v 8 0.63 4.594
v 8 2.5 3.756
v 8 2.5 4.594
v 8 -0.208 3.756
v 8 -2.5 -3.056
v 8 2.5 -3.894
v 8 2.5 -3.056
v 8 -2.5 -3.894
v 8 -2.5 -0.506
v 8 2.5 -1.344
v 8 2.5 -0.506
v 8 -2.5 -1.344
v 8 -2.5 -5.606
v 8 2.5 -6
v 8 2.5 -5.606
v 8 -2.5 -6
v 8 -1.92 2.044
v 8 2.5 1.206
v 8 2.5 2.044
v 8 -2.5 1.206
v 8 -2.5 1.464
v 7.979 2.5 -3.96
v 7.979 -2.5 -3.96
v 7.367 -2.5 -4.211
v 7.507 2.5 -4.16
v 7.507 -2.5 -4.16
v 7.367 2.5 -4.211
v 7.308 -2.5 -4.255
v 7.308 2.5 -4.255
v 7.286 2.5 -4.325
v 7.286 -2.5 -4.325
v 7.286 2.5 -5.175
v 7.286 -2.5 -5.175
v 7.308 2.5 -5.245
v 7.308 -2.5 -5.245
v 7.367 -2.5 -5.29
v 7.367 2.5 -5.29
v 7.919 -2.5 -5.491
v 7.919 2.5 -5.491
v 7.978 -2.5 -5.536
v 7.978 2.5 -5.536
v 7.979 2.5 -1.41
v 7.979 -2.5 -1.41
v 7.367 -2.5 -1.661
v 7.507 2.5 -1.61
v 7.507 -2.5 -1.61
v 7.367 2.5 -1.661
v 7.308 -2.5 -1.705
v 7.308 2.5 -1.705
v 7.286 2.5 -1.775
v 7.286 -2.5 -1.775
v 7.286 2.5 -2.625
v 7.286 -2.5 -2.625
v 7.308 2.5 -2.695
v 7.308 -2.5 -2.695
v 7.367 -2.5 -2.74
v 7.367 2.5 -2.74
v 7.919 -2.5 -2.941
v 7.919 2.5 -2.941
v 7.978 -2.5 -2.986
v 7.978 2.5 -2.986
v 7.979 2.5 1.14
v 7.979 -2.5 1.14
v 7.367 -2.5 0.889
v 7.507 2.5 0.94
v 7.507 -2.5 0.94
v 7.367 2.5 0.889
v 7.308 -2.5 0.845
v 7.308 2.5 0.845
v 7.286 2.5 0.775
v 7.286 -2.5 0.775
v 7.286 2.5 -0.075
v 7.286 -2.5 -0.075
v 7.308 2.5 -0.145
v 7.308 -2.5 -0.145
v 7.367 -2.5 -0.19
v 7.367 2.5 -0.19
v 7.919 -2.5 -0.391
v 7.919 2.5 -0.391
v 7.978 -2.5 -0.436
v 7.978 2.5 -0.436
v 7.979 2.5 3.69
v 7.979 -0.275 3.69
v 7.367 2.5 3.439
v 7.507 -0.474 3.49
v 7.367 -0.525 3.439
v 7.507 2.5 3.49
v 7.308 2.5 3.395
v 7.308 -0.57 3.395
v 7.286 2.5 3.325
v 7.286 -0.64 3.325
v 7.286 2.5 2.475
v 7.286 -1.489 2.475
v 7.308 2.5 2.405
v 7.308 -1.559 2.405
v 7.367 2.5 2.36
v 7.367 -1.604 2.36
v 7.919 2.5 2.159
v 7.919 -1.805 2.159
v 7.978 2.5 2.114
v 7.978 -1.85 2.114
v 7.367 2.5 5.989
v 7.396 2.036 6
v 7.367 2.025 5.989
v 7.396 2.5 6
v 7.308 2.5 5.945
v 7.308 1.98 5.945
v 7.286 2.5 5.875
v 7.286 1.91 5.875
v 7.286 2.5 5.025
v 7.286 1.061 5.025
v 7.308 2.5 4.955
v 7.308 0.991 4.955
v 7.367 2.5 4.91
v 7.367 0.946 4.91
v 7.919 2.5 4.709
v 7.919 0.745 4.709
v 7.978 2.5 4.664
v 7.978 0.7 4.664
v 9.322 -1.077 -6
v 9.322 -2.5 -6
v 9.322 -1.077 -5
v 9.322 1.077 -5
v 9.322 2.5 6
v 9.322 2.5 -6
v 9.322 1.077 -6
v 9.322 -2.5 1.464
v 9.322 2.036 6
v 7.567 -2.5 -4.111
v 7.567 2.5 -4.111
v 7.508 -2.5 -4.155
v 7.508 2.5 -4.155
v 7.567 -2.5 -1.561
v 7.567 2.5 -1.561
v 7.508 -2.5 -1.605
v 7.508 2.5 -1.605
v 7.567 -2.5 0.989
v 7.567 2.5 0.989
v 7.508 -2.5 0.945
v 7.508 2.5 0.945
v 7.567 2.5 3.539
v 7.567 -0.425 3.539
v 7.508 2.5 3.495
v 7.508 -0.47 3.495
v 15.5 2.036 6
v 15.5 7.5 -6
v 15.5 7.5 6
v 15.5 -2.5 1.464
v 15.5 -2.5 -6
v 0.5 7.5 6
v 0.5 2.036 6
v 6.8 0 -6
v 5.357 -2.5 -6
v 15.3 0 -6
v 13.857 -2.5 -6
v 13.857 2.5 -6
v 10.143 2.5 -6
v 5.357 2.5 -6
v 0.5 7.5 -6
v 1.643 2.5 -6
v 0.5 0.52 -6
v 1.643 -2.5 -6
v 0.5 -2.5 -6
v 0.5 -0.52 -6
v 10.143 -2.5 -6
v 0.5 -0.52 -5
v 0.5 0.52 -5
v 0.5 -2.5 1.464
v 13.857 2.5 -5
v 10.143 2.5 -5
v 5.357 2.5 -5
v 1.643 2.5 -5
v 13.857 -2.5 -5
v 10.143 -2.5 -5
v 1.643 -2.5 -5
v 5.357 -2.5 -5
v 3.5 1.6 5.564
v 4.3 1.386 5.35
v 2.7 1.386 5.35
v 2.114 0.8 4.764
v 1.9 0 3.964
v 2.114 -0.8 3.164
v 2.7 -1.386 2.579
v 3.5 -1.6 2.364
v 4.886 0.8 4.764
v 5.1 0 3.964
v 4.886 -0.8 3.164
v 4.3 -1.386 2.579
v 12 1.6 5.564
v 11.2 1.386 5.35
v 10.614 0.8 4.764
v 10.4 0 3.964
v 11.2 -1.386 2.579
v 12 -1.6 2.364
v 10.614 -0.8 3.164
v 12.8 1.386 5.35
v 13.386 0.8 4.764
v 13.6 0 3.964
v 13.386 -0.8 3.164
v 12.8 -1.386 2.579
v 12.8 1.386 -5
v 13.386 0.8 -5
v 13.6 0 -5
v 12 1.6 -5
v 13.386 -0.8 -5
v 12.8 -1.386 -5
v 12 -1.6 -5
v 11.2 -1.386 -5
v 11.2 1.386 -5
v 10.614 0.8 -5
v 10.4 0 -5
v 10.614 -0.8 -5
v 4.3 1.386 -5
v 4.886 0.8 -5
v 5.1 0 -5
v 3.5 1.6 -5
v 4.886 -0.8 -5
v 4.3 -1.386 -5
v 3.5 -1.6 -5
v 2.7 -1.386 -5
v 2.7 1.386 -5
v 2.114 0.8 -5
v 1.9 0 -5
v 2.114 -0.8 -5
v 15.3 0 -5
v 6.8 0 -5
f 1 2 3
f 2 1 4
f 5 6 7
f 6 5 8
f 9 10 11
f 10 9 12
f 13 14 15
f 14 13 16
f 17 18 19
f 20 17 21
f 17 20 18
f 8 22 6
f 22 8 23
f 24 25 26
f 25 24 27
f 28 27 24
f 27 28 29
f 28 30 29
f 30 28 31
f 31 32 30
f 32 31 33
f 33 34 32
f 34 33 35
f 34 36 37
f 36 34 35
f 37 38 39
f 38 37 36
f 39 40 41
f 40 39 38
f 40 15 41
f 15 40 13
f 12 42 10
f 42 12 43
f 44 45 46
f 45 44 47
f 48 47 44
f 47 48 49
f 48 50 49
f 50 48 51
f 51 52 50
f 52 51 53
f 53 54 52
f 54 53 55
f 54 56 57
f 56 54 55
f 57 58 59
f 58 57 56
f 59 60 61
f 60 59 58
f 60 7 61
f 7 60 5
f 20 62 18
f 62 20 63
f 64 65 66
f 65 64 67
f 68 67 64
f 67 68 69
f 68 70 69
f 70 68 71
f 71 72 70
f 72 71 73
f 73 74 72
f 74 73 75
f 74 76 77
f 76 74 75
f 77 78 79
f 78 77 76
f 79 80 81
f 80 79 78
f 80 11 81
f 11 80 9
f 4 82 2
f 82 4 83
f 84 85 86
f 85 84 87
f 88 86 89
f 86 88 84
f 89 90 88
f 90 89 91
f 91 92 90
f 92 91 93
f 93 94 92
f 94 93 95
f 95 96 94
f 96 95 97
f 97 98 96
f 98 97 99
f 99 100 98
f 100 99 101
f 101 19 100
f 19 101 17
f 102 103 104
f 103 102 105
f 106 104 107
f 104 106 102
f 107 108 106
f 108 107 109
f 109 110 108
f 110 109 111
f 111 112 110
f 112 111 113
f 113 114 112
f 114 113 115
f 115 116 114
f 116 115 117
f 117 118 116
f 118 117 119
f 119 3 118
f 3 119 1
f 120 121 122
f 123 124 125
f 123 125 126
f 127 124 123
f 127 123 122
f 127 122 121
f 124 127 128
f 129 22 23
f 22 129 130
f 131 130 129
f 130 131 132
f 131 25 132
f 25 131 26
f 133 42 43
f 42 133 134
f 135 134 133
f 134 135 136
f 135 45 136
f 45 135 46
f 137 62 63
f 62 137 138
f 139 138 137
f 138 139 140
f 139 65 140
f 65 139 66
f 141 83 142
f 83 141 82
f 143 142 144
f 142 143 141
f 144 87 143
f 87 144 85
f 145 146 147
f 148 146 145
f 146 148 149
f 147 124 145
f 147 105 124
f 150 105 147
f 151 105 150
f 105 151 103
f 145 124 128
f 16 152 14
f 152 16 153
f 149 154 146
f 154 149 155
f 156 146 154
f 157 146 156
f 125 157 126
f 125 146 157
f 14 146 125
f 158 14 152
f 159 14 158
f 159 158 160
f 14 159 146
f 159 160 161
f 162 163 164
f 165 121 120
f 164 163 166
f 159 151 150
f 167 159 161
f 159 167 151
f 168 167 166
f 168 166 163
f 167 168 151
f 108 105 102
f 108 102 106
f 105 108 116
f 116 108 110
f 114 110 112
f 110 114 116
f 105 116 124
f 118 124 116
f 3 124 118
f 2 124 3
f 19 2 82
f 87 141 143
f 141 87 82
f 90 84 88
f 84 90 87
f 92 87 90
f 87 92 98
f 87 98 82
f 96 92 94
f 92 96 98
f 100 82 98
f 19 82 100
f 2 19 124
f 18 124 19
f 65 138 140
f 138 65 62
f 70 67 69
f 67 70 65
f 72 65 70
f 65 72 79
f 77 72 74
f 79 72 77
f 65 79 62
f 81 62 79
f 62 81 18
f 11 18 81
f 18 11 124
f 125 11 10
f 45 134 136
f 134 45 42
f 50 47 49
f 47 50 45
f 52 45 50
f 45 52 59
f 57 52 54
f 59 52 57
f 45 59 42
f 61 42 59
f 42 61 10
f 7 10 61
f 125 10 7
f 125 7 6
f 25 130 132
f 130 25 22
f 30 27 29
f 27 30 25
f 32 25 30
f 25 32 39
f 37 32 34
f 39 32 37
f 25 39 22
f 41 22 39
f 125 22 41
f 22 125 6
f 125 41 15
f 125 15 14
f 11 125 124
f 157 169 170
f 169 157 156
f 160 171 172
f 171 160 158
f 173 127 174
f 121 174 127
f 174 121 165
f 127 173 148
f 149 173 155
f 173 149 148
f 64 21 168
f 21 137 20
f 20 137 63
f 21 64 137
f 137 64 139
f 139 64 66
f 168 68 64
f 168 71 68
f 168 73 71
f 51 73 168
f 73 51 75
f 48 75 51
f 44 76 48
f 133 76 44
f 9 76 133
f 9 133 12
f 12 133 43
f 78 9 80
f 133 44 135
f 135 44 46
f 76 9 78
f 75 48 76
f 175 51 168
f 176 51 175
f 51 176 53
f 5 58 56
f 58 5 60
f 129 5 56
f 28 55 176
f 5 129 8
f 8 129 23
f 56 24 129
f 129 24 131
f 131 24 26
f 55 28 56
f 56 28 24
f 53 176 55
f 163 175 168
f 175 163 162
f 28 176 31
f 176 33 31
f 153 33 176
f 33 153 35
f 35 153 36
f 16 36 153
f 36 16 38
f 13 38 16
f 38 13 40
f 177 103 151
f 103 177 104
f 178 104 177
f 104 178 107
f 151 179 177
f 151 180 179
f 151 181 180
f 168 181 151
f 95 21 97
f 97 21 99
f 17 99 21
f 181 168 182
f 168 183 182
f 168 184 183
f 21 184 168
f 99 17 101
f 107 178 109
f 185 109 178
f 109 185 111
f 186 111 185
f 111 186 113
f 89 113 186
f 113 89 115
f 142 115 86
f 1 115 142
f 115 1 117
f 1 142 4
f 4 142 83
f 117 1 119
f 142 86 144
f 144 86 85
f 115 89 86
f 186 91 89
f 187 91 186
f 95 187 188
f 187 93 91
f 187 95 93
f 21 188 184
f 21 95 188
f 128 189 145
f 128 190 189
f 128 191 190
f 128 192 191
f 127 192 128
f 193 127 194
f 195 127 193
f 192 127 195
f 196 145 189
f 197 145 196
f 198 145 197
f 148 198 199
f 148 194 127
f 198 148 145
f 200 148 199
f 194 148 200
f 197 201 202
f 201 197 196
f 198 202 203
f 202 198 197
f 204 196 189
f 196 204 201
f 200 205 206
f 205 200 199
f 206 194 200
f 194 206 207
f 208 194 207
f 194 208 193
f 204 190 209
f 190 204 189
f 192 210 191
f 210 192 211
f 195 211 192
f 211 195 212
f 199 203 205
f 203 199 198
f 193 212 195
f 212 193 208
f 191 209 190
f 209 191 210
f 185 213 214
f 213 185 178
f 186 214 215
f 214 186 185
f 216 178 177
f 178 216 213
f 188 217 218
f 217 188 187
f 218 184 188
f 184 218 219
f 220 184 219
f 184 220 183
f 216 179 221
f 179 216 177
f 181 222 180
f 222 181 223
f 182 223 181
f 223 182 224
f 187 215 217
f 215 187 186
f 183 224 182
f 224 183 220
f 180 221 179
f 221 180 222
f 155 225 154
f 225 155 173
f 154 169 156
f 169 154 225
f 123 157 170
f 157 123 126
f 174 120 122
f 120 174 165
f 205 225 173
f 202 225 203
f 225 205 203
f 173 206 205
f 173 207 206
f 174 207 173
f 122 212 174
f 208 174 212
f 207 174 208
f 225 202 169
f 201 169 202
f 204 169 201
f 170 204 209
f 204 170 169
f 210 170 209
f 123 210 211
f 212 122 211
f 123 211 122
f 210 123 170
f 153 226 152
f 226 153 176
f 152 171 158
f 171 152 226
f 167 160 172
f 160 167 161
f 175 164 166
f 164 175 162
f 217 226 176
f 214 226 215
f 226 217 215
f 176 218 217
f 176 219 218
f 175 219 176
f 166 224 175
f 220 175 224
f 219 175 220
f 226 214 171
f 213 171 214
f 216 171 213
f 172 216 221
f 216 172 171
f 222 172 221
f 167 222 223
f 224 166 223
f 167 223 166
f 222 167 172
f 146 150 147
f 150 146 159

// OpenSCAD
// file: linear_bearing.scad
// LM8UU
lm8uu_od = 19;
lm8uu_length = 29;
lm8uu_id = 10.2;
/**/

// LME8UU
/*
lm8uu_od = 16
lm8uu_length = 25
lm8uu_id = 8.1
/**/


// these values should be copied from your slicing program

layer_height = 0.2;

// SKEINFORGE calculates extrusion_width = layer_height * perimeter_width_over_thickness
// SFACT exposes this directly
// SLIC3R lists extrusion width in the header of exported gcode files as "single wall width"
//        it also allows you to specify as extrusion_width = layer_height * extrusion_width_ratio if you want to force it

extrusion_width = 0.6;

// this should also come from your slicing program, however it's usually an internal value. Most use approximately 0.15

overlap_ratio = 0.15;

// leave this as is, or punch in a value if you have an exact figure in mind
wall_width = extrusion_width * 2 - extrusion_width * overlap_ratio; 

echo("wall_width: ",wall_width);

// this is how many points of contact we have
fins = 5;

// this is how long the points of contact are vs the space between them
// if you make it too small, there's no gaps in the middle ring and we lose the springiness

contact_percent = 20;

// this is how far around the fins twist.
// 100% = the head of one overlaps the tail of the next one
twist_percent = 50;

/****************************************************
	you shouldn't need to touch anything below here
*****************************************************/

// make sure all the circles have parallel segments
$fn=64;


union() {
	// outer ring
	difference() {
		cylinder(r=lm8uu_od / 2, h=lm8uu_length - layer_height);
		translate([0, 0, -1]) cylinder(r=lm8uu_od / 2 - wall_width, h=lm8uu_length + 2);
	}
	
	// inner extruded profile
	linear_extrude(height = lm8uu_length - layer_height, twist=360 / fins * twist_percent / 100, slices = (lm8uu_length - layer_height) * 2)
		for (i=[0:fins - 1])
			rotate(360 / fins * i)
				union() /**/ {
					intersection() {
						difference() {
							circle(lm8uu_od / 2);
							translate([-lm8uu_od, -lm8uu_od]) square([lm8uu_od, lm8uu_od * 2]);
							rotate(360 / fins * contact_percent / 100)
								translate([0, -lm8uu_od])
									square([lm8uu_od, lm8uu_od * 2]);
						}
						difference() {
							circle(r=lm8uu_id / 2 + wall_width);
							circle(r=lm8uu_id / 2);
						}
					}
					
					intersection() {
						rotate(360 / fins * contact_percent / 100) difference() {
							circle(lm8uu_od / 2);
							translate([-lm8uu_od, -lm8uu_od]) square([lm8uu_od, lm8uu_od * 2]);
							rotate(360 / fins * (1 - (contact_percent / 100))) translate([0, -lm8uu_od]) square([lm8uu_od, lm8uu_od * 2]);
						}
						difference() {
							circle(r=lm8uu_id / 2 + wall_width * 2);
							circle(r=lm8uu_id / 2 + wall_width);
						}
					}
					
					rotate(360 / fins) translate([0, -lm8uu_id / 2 - wall_width / 2]) circle(wall_width / 2, $fn=16);
					rotate(360 / fins * contact_percent / 100) translate([0, -lm8uu_id / 2 - wall_width / 2]) circle(wall_width / 2, $fn=16);
					rotate(360 / fins * contact_percent / 100) translate([0, -lm8uu_id / 2 - wall_width * 1.5]) circle(wall_width / 2, $fn=16);
					rotate(360 / fins) translate([0, -lm8uu_id / 2 - wall_width * 1.5]) circle(wall_width / 2, $fn=16);
					rotate(360 / fins * contact_percent / 100) translate([-wall_width / 2, -lm8uu_id / 2 - wall_width * 1.5]) square([wall_width, wall_width]);
					rotate(360 / fins) translate([-wall_width / 2, -lm8uu_id / 2 - wall_width * 1.5]) square([wall_width, wall_width]);
					rotate(360 / fins * contact_percent / 100 + 360 / fins * (1 - (contact_percent / 100)) / 2) translate([-wall_width / 2, -lm8uu_id / 2 - wall_width * 1.5]) mirror([0, 1]) square([wall_width, (lm8uu_od / 2 - wall_width / 2) - (lm8uu_id / 2 + wall_width * 1.5)]);
	
				}
}
// file: carriage-V1.2.scad
// Enlarged Rostock Motor End inspired from Jcrocholl modified by Kolergy to:
//    - Take 12x1000mm smooth rods and KB-12-WW Linear Bearings
//    - Should clip the bearings (Not yet tested)
//    - 0.10° bearing holder angles to compensate play
//    - Changed droove to improve fabricability
//    - T2.5 self locking belt mount based on belt_coupler_v6 from Okatake

 
include <configuration.scad>
use <linear_bearing.scad>
use <belt_coupler_v6_Mod.scad>

H  = carriage_height;
W  = 60;
d  = 22;
th = 4;

width = 76;                  // Caridge widith
//height = carriage_height;

offset = 25;
cutout = 13;                 // Universal joint cutout
middle = 2*offset - width/2;


//% translate([ W/2, 0, 0]) linear_bearing("KB-12-WW");
//% translate([-W/2, 0, 0]) linear_bearing("KB-12-WW");

module conical_groove(d1, d2, w) {
	difference() {
		translate([0, 0, -w  ]) cylinder(r =d1/2+0.1,       h=w*2,     center=true);
		translate([0, 0, -w/2]) cylinder(r1=d2/2  ,r2=d1/2, h=w+0.1,   center=true);
		translate([0, 0, -w  ]) cylinder(r =d2/2,           h=w*2+0.1, center=true);
	}
}

module groove(d1, d2, w) {
		difference() {
			cylinder(r=d1/2+1, h=w, center=true);
			cylinder(r=d2/2  , h=w, center=true);
			translate([0, 0, w/2]) cylinder(r1=d2/2  ,r2=d1/2, h=w/1.5,   center=true);
		}
}

module LB_holder(d, w, H, dH) {
	difference() {
		union() {
			difference() {
				translate([ w,   0, 0]) cylinder(r=d/2+th, h=H+dH,   center=true);
				translate([ w,   0, 0]) cylinder(r=d/2,    h=H+dH+2, center=true);
			}
			translate([ w,  0, -H/2])  conical_groove(d, d-2, dH/4);
			translate([ w,  0,  H/2])  rotate([ 180,  0,  0]) conical_groove(d, d-2, dH/4);
		}
		//translate([ w,  0,  H/2-5])  groove(d+2*th+1, d+2*th-4, 3);
		//translate([ w,  0,  -H/2+5])  groove(d+2*th+1, d+2*th-4, 3);
		translate([ w, d/2+3, 0]) cube([d+2*th+2, d, H+dH+2], center=true);
	}
}

module parallel_joints(reinforced) {
  difference() {
    union() {
      intersection() {   // UJoint Arms
        cube([width, 20, 8], center=true);
        rotate([0, 90, 0]) cylinder(r=5, h=width, center=true);
      }
      intersection() {
        translate([0, 18, 4]) rotate([45, 0, 0])
          cube([width, reinforced, reinforced], center=true);
        translate([0, 0, 20]) cube([width, 35, 40], center=true);
      }
      translate([0, 8, 0]) cube([width, 16, 8], center=true);
    }
    rotate([0, 90, 0]) cylinder(r=1.55, h=80, center=true, $fn=12);

    for (x = [-offset, offset]) {
      translate([x, 5.5, 0])
        cylinder(r=cutout/2, h=100, center=true, $fn=24);
      translate([x, -4.5, 0])
        cube([cutout, 20, 100], center=true);
      translate([x, 0, 0]) rotate([0, 90, 0]) rotate([0, 0, 30])
        cylinder(r=3.3, h=17, center=true, $fn=6);
    }
    translate([0, 2, 0]) cylinder(r=middle, h=100, center=true);
    translate([0, -8, 0]) cube([2*middle, 20, 100], center=true);
  }
}

module belt_mount() {
  difference() {
    union() {
      difference() {
        translate([8, 0, 0]) cube([4, 14, H+4], center=true);
        for (z = [-3.5, 3.5])
          translate([8, 0, z]) cube([5, 14, 3], center=true);
      }
      for (y = [-2.5, 1.5, 6.5]) {
        translate([8, y, 0]) cube([4, 1.2, H+4], center=true);
      }
    }
  }
}

module belt_mount2() {
        translate([8, 8, 0]) 
	difference() {
		union() {
			rotate([90, -90, 0]) coupler();
			translate([0, -17, 0]) cylinder(r=5, h=H+th, center=true, $fn=12);
		}
      	for (y = [-0.7, 0.7]) {
        		translate([0, -3, y*H/2]) rotate([0, 90, 0]) cylinder(r=1.6, h=5, center=true, $fn=12);
		}
	}
}

module belt_mount3() {
	difference(){
		union(){
			translate([9, -5.25, 0]) cube([17, 4.5, H+th], center=true);
			translate([9, 0, (H+th)/2-7]) 
			difference() {
				cube([17, 6, 14], center=true);
				translate([0, 2, -5]) rotate([-45, 0,  0]) cube([18, 6, 12], center=true);
			}
		translate([9, 0, -(H+th)/2+2.]) cube([17, 6, 4], center=true);
		}
	translate([12.0,  0, 0]) cylinder(r=1.6, h=H+th+2, center=true, $fn=12);
	translate([ 3.5,  0, 0]) cylinder(r=1.6, h=H+th+2, center=true, $fn=12);
	translate([ 8.0, 14.35, -(H+th)/2+1]) rotate([90, -90, 0]) belt();
	translate([ 8.2, 13.85, -(H+th)/2+1]) rotate([90, -90, 0]) belt(); // Slightly enlarge the gap of the belt
	translate([8, 0.5, -(H+th)/2+2.5]) cube([3, 6, 6], center=true);
	}
}
module carriage() {
	difference() {
		union() {
			difference() {
				union() {
					translate([ 0,  -th-7, 0]) cube([W, 8, H+4], center=true);
					translate([ 0,  -28,  -H/2+2])  parallel_joints(16);
				}
				translate([ W/2,   0, 0]) cylinder(r=d/2+1,    h=H+4+2, center=true);
				translate([-W/2,   0, 0]) cylinder(r=d/2+1,    h=H+4+2, center=true);
			}
			// 0.10° rotation to compensate play on different axis
			rotate([0, 0.10,  0]) LB_holder(d,  W/2, H, 4); 
			rotate([0.10,  0, 0]) LB_holder(d, -W/2, H, 4);
    			belt_mount3();
		}
		// Grooves
		translate([ W/2,  0,  H/2-5])  groove(d+2*5+1, d+2*th-4, 4);
		translate([ W/2,  0, -H/2+5])  groove(d+2*5+1, d+2*th-4, 4);
		translate([-W/2,  0,  H/2-5])  groove(d+2*5+1, d+2*th-4, 4);
		translate([-W/2,  0, -H/2+5])  groove(d+2*5+1, d+2*th-4, 4);
		// Screw hole for adjustable top endstop.
		translate([15, -17, -H/2+4]) cylinder(r=1.5, h=20, center=true, $fn=12);

	}

}
//translate([ w,  0, 0]) cylinder(r=11  , h=H+dH+2, center=true);
carriage();

// Uncomment the following lines to check endstop alignment.
// use <idler_end.scad>;
// translate([0, 0, -20]) rotate([180, 0, 0]) idler_end();
// file: belt_coupler_v6_Mod.scad
include <configuration.scad>

coupler_w = carriage_height+4;
coupler_h = 4.5;
coupler_d = 15;

belt_w = 15.5;
belt_n = 16;
belt_margin = 0.50;

coupler();

// coupler
module coupler() {
	difference(){
		translate([0,-0.20,-coupler_d/2+belt_w])cube([coupler_w,coupler_h,coupler_d],center=true);
		//for (axis_x = [-1:2:1]) {
			translate([-20,0,-0.01])
				scale(1.02)belt_length(profile = "T2.5", belt_width = belt_w+1, n = belt_n);
		//}
	}
}

module belt() {
	scale(1.02)belt_length(profile = "T2.5", belt_width = belt_w+1, n = belt_n);
}

// belt
//for (axis_x = [-1:2:1]) {
//	translate([2.00*belt_n*axis_x-11.25,0,-0.01])
//		%scale(1.02)belt_length(profile = "T2.5", belt_width = belt_w+1, n = belt_n);
//}

//================================================
// Module Section
//================================================
//Outer Module
module belt_length(profile = "T2.5", belt_width = 6, n = 10)
{

			if ( profile == "T2.5" ) 
				{ 
					_belt_length(
						profile=profile, 
						n = n, 
						belt_width = belt_width,
						tooth_pitch = 2.5,
						backing_thickness = 0.6 + belt_margin
						);
				}
			if ( profile == "T5" ) 
				{ 
					_belt_length(
						profile=profile, 
						n = n, 
						belt_width = belt_width,
						tooth_pitch = 5,
						backing_thickness = 1 + belt_margin
						);
				}
			if ( profile == "T10" ) 
				{ 
					_belt_length(
						profile=profile, 
						n = n, 
						belt_width = belt_width,
						tooth_pitch = 10,
						backing_thickness = 2 + belt_margin
						);
				}
			if ( profile == "MXL" ) 
				{ 
					_belt_length(
						profile=profile, 
						n = n, 
						belt_width = belt_width,
						tooth_pitch = 2.032,
						backing_thickness = 0.64 + belt_margin
						);
				}


}

//inner module
module _belt_length(profile = "T2.5", n = 10, belt_width = 5, tooth_pitch = 2.5, backing_thickness = 0.6)
{

for( i = [0:n])
	{
		union(){

			if ( profile == "T2.5" ) { translate([tooth_pitch*i,0,0])T2_5(width = belt_width);}
			if ( profile == "T5" ) { translate([tooth_pitch*i,0,0])T5(width = belt_width);}
			if ( profile == "T10" ) { translate([tooth_pitch*i,0,0])T10(width = belt_width);}
			if ( profile == "MXL" ) { translate([tooth_pitch*i,0,0])MXL(width = belt_width);}
			translate([(tooth_pitch*i)-(tooth_pitch/2),-backing_thickness,0])cube([tooth_pitch,backing_thickness,belt_width]);
		}
	}
}

//Tooth Form modules - Taken from http://www.thingiverse.com/thing:1662
module T2_5(width = 2)
	{
	linear_extrude(height=width) polygon([[-0.839258,-0.5],[-0.839258,0],[-0.770246,0.021652],[-0.726369,0.079022],[-0.529167,0.620889],[-0.485025,0.67826],[-0.416278,0.699911],[0.416278,0.699911],[0.484849,0.67826],[0.528814,0.620889],[0.726369,0.079022],[0.770114,0.021652],[0.839258,0],[0.839258,-0.5]]);
	}

module T5(width = 2)
	{
	linear_extrude(height=width) polygon([[-1.632126,-0.5],[-1.632126,0],[-1.568549,0.004939],[-1.507539,0.019367],[-1.450023,0.042686],[-1.396912,0.074224],[-1.349125,0.113379],[-1.307581,0.159508],[-1.273186,0.211991],[-1.246868,0.270192],[-1.009802,0.920362],[-0.983414,0.978433],[-0.949018,1.030788],[-0.907524,1.076798],[-0.859829,1.115847],[-0.80682,1.147314],[-0.749402,1.170562],[-0.688471,1.184956],[-0.624921,1.189895],[0.624971,1.189895],[0.688622,1.184956],[0.749607,1.170562],[0.807043,1.147314],[0.860055,1.115847],[0.907754,1.076798],[0.949269,1.030788],[0.9837,0.978433],[1.010193,0.920362],[1.246907,0.270192],[1.273295,0.211991],[1.307726,0.159508],[1.349276,0.113379],[1.397039,0.074224],[1.450111,0.042686],[1.507589,0.019367],[1.568563,0.004939],[1.632126,0],[1.632126,-0.5]]);
	}

module T10(width = 2)
	{
	linear_extrude(height=width) polygon([[-3.06511,-1],[-3.06511,0],[-2.971998,0.007239],[-2.882718,0.028344],[-2.79859,0.062396],[-2.720931,0.108479],[-2.651061,0.165675],[-2.590298,0.233065],[-2.539962,0.309732],[-2.501371,0.394759],[-1.879071,2.105025],[-1.840363,2.190052],[-1.789939,2.266719],[-1.729114,2.334109],[-1.659202,2.391304],[-1.581518,2.437387],[-1.497376,2.47144],[-1.408092,2.492545],[-1.314979,2.499784],[1.314979,2.499784],[1.408091,2.492545],[1.497371,2.47144],[1.581499,2.437387],[1.659158,2.391304],[1.729028,2.334109],[1.789791,2.266719],[1.840127,2.190052],[1.878718,2.105025],[2.501018,0.394759],[2.539726,0.309732],[2.59015,0.233065],[2.650975,0.165675],[2.720887,0.108479],[2.798571,0.062396],[2.882713,0.028344],[2.971997,0.007239],[3.06511,0],[3.06511,-1]]);
	}

module MXL(width = 2)
	{
	linear_extrude(height=width) polygon([[-0.660421,-0.5],[-0.660421,0],[-0.621898,0.006033],[-0.587714,0.023037],[-0.560056,0.049424],[-0.541182,0.083609],[-0.417357,0.424392],[-0.398413,0.458752],[-0.370649,0.48514],[-0.336324,0.502074],[-0.297744,0.508035],[0.297744,0.508035],[0.336268,0.502074],[0.370452,0.48514],[0.39811,0.458752],[0.416983,0.424392],[0.540808,0.083609],[0.559752,0.049424],[0.587516,0.023037],[0.621841,0.006033],[0.660421,0],[0.660421,-0.5]]);
	}
// file: configuration.scad
// Rostock Motor End from Jcrocholl modified by Kolergy to:
//    - Take 12x1000mm smooth rods and KB-12-WW Linear Bearings
//    - Increased base height to locate electronics below the base
//    - Stand on three feets


motor_end_height      =  64;  // Was 44
idler_end_height      =  28;
carriage_height       =  32; // Adapted to cover full length +2 of the Linear bearing
platform_thickness    =   8;
bed_thickness         =  12;
pcb_thickness         =   2;
smooth_rod_length     =1000;
platform_hinge_offset =  33;
carriage_hinge_offset =  22;
tower_radius          = 300;
rod_length            = tower_radius * 1.44;
// main file
// Enlarged Rostock Belt tensioner
//    - T2.5 self locking belt geometry based on belt_coupler_v6 from Okatake

include <configuration.scad>
use <belt_coupler_v6_Mod.scad>
use <carriage-V1.2.scad>

H  = carriage_height;
th = 4;

//%carriage();

union(){
	translate([8, 5, 0]) cube([15, 5., 12], center=true);
	difference() {
		translate([8, 0, 0]) cube([15, 5, 12], center=true);
		translate([8, 0, 7.5]) rotate([-45, 0,  0]) cube([17, 5, 15], center=true);
		translate([ 8, 14., -(H+th)/2+0.5]) rotate([90, -90, 0]) belt();
		translate([ 8.2, 14.0, -(H+th)/2+0.6]) rotate([90, -90, 0]) belt(); // Slightly enlarge the gap of the belt

		translate([12, 0, 0]) cylinder(r=1.6, h=H+th+2, center=true, $fn=12);
		translate([ 3.5, 0, 0]) cylinder(r=1.6, h=H+th+2, center=true, $fn=12);
		translate([12, 0, -7]) cylinder(r=3.3, h=4, center=true, $fn=6);
		translate([ 3.5, 0, -7]) cylinder(r=3.3, h=4, center=true, $fn=6);
	}
}
